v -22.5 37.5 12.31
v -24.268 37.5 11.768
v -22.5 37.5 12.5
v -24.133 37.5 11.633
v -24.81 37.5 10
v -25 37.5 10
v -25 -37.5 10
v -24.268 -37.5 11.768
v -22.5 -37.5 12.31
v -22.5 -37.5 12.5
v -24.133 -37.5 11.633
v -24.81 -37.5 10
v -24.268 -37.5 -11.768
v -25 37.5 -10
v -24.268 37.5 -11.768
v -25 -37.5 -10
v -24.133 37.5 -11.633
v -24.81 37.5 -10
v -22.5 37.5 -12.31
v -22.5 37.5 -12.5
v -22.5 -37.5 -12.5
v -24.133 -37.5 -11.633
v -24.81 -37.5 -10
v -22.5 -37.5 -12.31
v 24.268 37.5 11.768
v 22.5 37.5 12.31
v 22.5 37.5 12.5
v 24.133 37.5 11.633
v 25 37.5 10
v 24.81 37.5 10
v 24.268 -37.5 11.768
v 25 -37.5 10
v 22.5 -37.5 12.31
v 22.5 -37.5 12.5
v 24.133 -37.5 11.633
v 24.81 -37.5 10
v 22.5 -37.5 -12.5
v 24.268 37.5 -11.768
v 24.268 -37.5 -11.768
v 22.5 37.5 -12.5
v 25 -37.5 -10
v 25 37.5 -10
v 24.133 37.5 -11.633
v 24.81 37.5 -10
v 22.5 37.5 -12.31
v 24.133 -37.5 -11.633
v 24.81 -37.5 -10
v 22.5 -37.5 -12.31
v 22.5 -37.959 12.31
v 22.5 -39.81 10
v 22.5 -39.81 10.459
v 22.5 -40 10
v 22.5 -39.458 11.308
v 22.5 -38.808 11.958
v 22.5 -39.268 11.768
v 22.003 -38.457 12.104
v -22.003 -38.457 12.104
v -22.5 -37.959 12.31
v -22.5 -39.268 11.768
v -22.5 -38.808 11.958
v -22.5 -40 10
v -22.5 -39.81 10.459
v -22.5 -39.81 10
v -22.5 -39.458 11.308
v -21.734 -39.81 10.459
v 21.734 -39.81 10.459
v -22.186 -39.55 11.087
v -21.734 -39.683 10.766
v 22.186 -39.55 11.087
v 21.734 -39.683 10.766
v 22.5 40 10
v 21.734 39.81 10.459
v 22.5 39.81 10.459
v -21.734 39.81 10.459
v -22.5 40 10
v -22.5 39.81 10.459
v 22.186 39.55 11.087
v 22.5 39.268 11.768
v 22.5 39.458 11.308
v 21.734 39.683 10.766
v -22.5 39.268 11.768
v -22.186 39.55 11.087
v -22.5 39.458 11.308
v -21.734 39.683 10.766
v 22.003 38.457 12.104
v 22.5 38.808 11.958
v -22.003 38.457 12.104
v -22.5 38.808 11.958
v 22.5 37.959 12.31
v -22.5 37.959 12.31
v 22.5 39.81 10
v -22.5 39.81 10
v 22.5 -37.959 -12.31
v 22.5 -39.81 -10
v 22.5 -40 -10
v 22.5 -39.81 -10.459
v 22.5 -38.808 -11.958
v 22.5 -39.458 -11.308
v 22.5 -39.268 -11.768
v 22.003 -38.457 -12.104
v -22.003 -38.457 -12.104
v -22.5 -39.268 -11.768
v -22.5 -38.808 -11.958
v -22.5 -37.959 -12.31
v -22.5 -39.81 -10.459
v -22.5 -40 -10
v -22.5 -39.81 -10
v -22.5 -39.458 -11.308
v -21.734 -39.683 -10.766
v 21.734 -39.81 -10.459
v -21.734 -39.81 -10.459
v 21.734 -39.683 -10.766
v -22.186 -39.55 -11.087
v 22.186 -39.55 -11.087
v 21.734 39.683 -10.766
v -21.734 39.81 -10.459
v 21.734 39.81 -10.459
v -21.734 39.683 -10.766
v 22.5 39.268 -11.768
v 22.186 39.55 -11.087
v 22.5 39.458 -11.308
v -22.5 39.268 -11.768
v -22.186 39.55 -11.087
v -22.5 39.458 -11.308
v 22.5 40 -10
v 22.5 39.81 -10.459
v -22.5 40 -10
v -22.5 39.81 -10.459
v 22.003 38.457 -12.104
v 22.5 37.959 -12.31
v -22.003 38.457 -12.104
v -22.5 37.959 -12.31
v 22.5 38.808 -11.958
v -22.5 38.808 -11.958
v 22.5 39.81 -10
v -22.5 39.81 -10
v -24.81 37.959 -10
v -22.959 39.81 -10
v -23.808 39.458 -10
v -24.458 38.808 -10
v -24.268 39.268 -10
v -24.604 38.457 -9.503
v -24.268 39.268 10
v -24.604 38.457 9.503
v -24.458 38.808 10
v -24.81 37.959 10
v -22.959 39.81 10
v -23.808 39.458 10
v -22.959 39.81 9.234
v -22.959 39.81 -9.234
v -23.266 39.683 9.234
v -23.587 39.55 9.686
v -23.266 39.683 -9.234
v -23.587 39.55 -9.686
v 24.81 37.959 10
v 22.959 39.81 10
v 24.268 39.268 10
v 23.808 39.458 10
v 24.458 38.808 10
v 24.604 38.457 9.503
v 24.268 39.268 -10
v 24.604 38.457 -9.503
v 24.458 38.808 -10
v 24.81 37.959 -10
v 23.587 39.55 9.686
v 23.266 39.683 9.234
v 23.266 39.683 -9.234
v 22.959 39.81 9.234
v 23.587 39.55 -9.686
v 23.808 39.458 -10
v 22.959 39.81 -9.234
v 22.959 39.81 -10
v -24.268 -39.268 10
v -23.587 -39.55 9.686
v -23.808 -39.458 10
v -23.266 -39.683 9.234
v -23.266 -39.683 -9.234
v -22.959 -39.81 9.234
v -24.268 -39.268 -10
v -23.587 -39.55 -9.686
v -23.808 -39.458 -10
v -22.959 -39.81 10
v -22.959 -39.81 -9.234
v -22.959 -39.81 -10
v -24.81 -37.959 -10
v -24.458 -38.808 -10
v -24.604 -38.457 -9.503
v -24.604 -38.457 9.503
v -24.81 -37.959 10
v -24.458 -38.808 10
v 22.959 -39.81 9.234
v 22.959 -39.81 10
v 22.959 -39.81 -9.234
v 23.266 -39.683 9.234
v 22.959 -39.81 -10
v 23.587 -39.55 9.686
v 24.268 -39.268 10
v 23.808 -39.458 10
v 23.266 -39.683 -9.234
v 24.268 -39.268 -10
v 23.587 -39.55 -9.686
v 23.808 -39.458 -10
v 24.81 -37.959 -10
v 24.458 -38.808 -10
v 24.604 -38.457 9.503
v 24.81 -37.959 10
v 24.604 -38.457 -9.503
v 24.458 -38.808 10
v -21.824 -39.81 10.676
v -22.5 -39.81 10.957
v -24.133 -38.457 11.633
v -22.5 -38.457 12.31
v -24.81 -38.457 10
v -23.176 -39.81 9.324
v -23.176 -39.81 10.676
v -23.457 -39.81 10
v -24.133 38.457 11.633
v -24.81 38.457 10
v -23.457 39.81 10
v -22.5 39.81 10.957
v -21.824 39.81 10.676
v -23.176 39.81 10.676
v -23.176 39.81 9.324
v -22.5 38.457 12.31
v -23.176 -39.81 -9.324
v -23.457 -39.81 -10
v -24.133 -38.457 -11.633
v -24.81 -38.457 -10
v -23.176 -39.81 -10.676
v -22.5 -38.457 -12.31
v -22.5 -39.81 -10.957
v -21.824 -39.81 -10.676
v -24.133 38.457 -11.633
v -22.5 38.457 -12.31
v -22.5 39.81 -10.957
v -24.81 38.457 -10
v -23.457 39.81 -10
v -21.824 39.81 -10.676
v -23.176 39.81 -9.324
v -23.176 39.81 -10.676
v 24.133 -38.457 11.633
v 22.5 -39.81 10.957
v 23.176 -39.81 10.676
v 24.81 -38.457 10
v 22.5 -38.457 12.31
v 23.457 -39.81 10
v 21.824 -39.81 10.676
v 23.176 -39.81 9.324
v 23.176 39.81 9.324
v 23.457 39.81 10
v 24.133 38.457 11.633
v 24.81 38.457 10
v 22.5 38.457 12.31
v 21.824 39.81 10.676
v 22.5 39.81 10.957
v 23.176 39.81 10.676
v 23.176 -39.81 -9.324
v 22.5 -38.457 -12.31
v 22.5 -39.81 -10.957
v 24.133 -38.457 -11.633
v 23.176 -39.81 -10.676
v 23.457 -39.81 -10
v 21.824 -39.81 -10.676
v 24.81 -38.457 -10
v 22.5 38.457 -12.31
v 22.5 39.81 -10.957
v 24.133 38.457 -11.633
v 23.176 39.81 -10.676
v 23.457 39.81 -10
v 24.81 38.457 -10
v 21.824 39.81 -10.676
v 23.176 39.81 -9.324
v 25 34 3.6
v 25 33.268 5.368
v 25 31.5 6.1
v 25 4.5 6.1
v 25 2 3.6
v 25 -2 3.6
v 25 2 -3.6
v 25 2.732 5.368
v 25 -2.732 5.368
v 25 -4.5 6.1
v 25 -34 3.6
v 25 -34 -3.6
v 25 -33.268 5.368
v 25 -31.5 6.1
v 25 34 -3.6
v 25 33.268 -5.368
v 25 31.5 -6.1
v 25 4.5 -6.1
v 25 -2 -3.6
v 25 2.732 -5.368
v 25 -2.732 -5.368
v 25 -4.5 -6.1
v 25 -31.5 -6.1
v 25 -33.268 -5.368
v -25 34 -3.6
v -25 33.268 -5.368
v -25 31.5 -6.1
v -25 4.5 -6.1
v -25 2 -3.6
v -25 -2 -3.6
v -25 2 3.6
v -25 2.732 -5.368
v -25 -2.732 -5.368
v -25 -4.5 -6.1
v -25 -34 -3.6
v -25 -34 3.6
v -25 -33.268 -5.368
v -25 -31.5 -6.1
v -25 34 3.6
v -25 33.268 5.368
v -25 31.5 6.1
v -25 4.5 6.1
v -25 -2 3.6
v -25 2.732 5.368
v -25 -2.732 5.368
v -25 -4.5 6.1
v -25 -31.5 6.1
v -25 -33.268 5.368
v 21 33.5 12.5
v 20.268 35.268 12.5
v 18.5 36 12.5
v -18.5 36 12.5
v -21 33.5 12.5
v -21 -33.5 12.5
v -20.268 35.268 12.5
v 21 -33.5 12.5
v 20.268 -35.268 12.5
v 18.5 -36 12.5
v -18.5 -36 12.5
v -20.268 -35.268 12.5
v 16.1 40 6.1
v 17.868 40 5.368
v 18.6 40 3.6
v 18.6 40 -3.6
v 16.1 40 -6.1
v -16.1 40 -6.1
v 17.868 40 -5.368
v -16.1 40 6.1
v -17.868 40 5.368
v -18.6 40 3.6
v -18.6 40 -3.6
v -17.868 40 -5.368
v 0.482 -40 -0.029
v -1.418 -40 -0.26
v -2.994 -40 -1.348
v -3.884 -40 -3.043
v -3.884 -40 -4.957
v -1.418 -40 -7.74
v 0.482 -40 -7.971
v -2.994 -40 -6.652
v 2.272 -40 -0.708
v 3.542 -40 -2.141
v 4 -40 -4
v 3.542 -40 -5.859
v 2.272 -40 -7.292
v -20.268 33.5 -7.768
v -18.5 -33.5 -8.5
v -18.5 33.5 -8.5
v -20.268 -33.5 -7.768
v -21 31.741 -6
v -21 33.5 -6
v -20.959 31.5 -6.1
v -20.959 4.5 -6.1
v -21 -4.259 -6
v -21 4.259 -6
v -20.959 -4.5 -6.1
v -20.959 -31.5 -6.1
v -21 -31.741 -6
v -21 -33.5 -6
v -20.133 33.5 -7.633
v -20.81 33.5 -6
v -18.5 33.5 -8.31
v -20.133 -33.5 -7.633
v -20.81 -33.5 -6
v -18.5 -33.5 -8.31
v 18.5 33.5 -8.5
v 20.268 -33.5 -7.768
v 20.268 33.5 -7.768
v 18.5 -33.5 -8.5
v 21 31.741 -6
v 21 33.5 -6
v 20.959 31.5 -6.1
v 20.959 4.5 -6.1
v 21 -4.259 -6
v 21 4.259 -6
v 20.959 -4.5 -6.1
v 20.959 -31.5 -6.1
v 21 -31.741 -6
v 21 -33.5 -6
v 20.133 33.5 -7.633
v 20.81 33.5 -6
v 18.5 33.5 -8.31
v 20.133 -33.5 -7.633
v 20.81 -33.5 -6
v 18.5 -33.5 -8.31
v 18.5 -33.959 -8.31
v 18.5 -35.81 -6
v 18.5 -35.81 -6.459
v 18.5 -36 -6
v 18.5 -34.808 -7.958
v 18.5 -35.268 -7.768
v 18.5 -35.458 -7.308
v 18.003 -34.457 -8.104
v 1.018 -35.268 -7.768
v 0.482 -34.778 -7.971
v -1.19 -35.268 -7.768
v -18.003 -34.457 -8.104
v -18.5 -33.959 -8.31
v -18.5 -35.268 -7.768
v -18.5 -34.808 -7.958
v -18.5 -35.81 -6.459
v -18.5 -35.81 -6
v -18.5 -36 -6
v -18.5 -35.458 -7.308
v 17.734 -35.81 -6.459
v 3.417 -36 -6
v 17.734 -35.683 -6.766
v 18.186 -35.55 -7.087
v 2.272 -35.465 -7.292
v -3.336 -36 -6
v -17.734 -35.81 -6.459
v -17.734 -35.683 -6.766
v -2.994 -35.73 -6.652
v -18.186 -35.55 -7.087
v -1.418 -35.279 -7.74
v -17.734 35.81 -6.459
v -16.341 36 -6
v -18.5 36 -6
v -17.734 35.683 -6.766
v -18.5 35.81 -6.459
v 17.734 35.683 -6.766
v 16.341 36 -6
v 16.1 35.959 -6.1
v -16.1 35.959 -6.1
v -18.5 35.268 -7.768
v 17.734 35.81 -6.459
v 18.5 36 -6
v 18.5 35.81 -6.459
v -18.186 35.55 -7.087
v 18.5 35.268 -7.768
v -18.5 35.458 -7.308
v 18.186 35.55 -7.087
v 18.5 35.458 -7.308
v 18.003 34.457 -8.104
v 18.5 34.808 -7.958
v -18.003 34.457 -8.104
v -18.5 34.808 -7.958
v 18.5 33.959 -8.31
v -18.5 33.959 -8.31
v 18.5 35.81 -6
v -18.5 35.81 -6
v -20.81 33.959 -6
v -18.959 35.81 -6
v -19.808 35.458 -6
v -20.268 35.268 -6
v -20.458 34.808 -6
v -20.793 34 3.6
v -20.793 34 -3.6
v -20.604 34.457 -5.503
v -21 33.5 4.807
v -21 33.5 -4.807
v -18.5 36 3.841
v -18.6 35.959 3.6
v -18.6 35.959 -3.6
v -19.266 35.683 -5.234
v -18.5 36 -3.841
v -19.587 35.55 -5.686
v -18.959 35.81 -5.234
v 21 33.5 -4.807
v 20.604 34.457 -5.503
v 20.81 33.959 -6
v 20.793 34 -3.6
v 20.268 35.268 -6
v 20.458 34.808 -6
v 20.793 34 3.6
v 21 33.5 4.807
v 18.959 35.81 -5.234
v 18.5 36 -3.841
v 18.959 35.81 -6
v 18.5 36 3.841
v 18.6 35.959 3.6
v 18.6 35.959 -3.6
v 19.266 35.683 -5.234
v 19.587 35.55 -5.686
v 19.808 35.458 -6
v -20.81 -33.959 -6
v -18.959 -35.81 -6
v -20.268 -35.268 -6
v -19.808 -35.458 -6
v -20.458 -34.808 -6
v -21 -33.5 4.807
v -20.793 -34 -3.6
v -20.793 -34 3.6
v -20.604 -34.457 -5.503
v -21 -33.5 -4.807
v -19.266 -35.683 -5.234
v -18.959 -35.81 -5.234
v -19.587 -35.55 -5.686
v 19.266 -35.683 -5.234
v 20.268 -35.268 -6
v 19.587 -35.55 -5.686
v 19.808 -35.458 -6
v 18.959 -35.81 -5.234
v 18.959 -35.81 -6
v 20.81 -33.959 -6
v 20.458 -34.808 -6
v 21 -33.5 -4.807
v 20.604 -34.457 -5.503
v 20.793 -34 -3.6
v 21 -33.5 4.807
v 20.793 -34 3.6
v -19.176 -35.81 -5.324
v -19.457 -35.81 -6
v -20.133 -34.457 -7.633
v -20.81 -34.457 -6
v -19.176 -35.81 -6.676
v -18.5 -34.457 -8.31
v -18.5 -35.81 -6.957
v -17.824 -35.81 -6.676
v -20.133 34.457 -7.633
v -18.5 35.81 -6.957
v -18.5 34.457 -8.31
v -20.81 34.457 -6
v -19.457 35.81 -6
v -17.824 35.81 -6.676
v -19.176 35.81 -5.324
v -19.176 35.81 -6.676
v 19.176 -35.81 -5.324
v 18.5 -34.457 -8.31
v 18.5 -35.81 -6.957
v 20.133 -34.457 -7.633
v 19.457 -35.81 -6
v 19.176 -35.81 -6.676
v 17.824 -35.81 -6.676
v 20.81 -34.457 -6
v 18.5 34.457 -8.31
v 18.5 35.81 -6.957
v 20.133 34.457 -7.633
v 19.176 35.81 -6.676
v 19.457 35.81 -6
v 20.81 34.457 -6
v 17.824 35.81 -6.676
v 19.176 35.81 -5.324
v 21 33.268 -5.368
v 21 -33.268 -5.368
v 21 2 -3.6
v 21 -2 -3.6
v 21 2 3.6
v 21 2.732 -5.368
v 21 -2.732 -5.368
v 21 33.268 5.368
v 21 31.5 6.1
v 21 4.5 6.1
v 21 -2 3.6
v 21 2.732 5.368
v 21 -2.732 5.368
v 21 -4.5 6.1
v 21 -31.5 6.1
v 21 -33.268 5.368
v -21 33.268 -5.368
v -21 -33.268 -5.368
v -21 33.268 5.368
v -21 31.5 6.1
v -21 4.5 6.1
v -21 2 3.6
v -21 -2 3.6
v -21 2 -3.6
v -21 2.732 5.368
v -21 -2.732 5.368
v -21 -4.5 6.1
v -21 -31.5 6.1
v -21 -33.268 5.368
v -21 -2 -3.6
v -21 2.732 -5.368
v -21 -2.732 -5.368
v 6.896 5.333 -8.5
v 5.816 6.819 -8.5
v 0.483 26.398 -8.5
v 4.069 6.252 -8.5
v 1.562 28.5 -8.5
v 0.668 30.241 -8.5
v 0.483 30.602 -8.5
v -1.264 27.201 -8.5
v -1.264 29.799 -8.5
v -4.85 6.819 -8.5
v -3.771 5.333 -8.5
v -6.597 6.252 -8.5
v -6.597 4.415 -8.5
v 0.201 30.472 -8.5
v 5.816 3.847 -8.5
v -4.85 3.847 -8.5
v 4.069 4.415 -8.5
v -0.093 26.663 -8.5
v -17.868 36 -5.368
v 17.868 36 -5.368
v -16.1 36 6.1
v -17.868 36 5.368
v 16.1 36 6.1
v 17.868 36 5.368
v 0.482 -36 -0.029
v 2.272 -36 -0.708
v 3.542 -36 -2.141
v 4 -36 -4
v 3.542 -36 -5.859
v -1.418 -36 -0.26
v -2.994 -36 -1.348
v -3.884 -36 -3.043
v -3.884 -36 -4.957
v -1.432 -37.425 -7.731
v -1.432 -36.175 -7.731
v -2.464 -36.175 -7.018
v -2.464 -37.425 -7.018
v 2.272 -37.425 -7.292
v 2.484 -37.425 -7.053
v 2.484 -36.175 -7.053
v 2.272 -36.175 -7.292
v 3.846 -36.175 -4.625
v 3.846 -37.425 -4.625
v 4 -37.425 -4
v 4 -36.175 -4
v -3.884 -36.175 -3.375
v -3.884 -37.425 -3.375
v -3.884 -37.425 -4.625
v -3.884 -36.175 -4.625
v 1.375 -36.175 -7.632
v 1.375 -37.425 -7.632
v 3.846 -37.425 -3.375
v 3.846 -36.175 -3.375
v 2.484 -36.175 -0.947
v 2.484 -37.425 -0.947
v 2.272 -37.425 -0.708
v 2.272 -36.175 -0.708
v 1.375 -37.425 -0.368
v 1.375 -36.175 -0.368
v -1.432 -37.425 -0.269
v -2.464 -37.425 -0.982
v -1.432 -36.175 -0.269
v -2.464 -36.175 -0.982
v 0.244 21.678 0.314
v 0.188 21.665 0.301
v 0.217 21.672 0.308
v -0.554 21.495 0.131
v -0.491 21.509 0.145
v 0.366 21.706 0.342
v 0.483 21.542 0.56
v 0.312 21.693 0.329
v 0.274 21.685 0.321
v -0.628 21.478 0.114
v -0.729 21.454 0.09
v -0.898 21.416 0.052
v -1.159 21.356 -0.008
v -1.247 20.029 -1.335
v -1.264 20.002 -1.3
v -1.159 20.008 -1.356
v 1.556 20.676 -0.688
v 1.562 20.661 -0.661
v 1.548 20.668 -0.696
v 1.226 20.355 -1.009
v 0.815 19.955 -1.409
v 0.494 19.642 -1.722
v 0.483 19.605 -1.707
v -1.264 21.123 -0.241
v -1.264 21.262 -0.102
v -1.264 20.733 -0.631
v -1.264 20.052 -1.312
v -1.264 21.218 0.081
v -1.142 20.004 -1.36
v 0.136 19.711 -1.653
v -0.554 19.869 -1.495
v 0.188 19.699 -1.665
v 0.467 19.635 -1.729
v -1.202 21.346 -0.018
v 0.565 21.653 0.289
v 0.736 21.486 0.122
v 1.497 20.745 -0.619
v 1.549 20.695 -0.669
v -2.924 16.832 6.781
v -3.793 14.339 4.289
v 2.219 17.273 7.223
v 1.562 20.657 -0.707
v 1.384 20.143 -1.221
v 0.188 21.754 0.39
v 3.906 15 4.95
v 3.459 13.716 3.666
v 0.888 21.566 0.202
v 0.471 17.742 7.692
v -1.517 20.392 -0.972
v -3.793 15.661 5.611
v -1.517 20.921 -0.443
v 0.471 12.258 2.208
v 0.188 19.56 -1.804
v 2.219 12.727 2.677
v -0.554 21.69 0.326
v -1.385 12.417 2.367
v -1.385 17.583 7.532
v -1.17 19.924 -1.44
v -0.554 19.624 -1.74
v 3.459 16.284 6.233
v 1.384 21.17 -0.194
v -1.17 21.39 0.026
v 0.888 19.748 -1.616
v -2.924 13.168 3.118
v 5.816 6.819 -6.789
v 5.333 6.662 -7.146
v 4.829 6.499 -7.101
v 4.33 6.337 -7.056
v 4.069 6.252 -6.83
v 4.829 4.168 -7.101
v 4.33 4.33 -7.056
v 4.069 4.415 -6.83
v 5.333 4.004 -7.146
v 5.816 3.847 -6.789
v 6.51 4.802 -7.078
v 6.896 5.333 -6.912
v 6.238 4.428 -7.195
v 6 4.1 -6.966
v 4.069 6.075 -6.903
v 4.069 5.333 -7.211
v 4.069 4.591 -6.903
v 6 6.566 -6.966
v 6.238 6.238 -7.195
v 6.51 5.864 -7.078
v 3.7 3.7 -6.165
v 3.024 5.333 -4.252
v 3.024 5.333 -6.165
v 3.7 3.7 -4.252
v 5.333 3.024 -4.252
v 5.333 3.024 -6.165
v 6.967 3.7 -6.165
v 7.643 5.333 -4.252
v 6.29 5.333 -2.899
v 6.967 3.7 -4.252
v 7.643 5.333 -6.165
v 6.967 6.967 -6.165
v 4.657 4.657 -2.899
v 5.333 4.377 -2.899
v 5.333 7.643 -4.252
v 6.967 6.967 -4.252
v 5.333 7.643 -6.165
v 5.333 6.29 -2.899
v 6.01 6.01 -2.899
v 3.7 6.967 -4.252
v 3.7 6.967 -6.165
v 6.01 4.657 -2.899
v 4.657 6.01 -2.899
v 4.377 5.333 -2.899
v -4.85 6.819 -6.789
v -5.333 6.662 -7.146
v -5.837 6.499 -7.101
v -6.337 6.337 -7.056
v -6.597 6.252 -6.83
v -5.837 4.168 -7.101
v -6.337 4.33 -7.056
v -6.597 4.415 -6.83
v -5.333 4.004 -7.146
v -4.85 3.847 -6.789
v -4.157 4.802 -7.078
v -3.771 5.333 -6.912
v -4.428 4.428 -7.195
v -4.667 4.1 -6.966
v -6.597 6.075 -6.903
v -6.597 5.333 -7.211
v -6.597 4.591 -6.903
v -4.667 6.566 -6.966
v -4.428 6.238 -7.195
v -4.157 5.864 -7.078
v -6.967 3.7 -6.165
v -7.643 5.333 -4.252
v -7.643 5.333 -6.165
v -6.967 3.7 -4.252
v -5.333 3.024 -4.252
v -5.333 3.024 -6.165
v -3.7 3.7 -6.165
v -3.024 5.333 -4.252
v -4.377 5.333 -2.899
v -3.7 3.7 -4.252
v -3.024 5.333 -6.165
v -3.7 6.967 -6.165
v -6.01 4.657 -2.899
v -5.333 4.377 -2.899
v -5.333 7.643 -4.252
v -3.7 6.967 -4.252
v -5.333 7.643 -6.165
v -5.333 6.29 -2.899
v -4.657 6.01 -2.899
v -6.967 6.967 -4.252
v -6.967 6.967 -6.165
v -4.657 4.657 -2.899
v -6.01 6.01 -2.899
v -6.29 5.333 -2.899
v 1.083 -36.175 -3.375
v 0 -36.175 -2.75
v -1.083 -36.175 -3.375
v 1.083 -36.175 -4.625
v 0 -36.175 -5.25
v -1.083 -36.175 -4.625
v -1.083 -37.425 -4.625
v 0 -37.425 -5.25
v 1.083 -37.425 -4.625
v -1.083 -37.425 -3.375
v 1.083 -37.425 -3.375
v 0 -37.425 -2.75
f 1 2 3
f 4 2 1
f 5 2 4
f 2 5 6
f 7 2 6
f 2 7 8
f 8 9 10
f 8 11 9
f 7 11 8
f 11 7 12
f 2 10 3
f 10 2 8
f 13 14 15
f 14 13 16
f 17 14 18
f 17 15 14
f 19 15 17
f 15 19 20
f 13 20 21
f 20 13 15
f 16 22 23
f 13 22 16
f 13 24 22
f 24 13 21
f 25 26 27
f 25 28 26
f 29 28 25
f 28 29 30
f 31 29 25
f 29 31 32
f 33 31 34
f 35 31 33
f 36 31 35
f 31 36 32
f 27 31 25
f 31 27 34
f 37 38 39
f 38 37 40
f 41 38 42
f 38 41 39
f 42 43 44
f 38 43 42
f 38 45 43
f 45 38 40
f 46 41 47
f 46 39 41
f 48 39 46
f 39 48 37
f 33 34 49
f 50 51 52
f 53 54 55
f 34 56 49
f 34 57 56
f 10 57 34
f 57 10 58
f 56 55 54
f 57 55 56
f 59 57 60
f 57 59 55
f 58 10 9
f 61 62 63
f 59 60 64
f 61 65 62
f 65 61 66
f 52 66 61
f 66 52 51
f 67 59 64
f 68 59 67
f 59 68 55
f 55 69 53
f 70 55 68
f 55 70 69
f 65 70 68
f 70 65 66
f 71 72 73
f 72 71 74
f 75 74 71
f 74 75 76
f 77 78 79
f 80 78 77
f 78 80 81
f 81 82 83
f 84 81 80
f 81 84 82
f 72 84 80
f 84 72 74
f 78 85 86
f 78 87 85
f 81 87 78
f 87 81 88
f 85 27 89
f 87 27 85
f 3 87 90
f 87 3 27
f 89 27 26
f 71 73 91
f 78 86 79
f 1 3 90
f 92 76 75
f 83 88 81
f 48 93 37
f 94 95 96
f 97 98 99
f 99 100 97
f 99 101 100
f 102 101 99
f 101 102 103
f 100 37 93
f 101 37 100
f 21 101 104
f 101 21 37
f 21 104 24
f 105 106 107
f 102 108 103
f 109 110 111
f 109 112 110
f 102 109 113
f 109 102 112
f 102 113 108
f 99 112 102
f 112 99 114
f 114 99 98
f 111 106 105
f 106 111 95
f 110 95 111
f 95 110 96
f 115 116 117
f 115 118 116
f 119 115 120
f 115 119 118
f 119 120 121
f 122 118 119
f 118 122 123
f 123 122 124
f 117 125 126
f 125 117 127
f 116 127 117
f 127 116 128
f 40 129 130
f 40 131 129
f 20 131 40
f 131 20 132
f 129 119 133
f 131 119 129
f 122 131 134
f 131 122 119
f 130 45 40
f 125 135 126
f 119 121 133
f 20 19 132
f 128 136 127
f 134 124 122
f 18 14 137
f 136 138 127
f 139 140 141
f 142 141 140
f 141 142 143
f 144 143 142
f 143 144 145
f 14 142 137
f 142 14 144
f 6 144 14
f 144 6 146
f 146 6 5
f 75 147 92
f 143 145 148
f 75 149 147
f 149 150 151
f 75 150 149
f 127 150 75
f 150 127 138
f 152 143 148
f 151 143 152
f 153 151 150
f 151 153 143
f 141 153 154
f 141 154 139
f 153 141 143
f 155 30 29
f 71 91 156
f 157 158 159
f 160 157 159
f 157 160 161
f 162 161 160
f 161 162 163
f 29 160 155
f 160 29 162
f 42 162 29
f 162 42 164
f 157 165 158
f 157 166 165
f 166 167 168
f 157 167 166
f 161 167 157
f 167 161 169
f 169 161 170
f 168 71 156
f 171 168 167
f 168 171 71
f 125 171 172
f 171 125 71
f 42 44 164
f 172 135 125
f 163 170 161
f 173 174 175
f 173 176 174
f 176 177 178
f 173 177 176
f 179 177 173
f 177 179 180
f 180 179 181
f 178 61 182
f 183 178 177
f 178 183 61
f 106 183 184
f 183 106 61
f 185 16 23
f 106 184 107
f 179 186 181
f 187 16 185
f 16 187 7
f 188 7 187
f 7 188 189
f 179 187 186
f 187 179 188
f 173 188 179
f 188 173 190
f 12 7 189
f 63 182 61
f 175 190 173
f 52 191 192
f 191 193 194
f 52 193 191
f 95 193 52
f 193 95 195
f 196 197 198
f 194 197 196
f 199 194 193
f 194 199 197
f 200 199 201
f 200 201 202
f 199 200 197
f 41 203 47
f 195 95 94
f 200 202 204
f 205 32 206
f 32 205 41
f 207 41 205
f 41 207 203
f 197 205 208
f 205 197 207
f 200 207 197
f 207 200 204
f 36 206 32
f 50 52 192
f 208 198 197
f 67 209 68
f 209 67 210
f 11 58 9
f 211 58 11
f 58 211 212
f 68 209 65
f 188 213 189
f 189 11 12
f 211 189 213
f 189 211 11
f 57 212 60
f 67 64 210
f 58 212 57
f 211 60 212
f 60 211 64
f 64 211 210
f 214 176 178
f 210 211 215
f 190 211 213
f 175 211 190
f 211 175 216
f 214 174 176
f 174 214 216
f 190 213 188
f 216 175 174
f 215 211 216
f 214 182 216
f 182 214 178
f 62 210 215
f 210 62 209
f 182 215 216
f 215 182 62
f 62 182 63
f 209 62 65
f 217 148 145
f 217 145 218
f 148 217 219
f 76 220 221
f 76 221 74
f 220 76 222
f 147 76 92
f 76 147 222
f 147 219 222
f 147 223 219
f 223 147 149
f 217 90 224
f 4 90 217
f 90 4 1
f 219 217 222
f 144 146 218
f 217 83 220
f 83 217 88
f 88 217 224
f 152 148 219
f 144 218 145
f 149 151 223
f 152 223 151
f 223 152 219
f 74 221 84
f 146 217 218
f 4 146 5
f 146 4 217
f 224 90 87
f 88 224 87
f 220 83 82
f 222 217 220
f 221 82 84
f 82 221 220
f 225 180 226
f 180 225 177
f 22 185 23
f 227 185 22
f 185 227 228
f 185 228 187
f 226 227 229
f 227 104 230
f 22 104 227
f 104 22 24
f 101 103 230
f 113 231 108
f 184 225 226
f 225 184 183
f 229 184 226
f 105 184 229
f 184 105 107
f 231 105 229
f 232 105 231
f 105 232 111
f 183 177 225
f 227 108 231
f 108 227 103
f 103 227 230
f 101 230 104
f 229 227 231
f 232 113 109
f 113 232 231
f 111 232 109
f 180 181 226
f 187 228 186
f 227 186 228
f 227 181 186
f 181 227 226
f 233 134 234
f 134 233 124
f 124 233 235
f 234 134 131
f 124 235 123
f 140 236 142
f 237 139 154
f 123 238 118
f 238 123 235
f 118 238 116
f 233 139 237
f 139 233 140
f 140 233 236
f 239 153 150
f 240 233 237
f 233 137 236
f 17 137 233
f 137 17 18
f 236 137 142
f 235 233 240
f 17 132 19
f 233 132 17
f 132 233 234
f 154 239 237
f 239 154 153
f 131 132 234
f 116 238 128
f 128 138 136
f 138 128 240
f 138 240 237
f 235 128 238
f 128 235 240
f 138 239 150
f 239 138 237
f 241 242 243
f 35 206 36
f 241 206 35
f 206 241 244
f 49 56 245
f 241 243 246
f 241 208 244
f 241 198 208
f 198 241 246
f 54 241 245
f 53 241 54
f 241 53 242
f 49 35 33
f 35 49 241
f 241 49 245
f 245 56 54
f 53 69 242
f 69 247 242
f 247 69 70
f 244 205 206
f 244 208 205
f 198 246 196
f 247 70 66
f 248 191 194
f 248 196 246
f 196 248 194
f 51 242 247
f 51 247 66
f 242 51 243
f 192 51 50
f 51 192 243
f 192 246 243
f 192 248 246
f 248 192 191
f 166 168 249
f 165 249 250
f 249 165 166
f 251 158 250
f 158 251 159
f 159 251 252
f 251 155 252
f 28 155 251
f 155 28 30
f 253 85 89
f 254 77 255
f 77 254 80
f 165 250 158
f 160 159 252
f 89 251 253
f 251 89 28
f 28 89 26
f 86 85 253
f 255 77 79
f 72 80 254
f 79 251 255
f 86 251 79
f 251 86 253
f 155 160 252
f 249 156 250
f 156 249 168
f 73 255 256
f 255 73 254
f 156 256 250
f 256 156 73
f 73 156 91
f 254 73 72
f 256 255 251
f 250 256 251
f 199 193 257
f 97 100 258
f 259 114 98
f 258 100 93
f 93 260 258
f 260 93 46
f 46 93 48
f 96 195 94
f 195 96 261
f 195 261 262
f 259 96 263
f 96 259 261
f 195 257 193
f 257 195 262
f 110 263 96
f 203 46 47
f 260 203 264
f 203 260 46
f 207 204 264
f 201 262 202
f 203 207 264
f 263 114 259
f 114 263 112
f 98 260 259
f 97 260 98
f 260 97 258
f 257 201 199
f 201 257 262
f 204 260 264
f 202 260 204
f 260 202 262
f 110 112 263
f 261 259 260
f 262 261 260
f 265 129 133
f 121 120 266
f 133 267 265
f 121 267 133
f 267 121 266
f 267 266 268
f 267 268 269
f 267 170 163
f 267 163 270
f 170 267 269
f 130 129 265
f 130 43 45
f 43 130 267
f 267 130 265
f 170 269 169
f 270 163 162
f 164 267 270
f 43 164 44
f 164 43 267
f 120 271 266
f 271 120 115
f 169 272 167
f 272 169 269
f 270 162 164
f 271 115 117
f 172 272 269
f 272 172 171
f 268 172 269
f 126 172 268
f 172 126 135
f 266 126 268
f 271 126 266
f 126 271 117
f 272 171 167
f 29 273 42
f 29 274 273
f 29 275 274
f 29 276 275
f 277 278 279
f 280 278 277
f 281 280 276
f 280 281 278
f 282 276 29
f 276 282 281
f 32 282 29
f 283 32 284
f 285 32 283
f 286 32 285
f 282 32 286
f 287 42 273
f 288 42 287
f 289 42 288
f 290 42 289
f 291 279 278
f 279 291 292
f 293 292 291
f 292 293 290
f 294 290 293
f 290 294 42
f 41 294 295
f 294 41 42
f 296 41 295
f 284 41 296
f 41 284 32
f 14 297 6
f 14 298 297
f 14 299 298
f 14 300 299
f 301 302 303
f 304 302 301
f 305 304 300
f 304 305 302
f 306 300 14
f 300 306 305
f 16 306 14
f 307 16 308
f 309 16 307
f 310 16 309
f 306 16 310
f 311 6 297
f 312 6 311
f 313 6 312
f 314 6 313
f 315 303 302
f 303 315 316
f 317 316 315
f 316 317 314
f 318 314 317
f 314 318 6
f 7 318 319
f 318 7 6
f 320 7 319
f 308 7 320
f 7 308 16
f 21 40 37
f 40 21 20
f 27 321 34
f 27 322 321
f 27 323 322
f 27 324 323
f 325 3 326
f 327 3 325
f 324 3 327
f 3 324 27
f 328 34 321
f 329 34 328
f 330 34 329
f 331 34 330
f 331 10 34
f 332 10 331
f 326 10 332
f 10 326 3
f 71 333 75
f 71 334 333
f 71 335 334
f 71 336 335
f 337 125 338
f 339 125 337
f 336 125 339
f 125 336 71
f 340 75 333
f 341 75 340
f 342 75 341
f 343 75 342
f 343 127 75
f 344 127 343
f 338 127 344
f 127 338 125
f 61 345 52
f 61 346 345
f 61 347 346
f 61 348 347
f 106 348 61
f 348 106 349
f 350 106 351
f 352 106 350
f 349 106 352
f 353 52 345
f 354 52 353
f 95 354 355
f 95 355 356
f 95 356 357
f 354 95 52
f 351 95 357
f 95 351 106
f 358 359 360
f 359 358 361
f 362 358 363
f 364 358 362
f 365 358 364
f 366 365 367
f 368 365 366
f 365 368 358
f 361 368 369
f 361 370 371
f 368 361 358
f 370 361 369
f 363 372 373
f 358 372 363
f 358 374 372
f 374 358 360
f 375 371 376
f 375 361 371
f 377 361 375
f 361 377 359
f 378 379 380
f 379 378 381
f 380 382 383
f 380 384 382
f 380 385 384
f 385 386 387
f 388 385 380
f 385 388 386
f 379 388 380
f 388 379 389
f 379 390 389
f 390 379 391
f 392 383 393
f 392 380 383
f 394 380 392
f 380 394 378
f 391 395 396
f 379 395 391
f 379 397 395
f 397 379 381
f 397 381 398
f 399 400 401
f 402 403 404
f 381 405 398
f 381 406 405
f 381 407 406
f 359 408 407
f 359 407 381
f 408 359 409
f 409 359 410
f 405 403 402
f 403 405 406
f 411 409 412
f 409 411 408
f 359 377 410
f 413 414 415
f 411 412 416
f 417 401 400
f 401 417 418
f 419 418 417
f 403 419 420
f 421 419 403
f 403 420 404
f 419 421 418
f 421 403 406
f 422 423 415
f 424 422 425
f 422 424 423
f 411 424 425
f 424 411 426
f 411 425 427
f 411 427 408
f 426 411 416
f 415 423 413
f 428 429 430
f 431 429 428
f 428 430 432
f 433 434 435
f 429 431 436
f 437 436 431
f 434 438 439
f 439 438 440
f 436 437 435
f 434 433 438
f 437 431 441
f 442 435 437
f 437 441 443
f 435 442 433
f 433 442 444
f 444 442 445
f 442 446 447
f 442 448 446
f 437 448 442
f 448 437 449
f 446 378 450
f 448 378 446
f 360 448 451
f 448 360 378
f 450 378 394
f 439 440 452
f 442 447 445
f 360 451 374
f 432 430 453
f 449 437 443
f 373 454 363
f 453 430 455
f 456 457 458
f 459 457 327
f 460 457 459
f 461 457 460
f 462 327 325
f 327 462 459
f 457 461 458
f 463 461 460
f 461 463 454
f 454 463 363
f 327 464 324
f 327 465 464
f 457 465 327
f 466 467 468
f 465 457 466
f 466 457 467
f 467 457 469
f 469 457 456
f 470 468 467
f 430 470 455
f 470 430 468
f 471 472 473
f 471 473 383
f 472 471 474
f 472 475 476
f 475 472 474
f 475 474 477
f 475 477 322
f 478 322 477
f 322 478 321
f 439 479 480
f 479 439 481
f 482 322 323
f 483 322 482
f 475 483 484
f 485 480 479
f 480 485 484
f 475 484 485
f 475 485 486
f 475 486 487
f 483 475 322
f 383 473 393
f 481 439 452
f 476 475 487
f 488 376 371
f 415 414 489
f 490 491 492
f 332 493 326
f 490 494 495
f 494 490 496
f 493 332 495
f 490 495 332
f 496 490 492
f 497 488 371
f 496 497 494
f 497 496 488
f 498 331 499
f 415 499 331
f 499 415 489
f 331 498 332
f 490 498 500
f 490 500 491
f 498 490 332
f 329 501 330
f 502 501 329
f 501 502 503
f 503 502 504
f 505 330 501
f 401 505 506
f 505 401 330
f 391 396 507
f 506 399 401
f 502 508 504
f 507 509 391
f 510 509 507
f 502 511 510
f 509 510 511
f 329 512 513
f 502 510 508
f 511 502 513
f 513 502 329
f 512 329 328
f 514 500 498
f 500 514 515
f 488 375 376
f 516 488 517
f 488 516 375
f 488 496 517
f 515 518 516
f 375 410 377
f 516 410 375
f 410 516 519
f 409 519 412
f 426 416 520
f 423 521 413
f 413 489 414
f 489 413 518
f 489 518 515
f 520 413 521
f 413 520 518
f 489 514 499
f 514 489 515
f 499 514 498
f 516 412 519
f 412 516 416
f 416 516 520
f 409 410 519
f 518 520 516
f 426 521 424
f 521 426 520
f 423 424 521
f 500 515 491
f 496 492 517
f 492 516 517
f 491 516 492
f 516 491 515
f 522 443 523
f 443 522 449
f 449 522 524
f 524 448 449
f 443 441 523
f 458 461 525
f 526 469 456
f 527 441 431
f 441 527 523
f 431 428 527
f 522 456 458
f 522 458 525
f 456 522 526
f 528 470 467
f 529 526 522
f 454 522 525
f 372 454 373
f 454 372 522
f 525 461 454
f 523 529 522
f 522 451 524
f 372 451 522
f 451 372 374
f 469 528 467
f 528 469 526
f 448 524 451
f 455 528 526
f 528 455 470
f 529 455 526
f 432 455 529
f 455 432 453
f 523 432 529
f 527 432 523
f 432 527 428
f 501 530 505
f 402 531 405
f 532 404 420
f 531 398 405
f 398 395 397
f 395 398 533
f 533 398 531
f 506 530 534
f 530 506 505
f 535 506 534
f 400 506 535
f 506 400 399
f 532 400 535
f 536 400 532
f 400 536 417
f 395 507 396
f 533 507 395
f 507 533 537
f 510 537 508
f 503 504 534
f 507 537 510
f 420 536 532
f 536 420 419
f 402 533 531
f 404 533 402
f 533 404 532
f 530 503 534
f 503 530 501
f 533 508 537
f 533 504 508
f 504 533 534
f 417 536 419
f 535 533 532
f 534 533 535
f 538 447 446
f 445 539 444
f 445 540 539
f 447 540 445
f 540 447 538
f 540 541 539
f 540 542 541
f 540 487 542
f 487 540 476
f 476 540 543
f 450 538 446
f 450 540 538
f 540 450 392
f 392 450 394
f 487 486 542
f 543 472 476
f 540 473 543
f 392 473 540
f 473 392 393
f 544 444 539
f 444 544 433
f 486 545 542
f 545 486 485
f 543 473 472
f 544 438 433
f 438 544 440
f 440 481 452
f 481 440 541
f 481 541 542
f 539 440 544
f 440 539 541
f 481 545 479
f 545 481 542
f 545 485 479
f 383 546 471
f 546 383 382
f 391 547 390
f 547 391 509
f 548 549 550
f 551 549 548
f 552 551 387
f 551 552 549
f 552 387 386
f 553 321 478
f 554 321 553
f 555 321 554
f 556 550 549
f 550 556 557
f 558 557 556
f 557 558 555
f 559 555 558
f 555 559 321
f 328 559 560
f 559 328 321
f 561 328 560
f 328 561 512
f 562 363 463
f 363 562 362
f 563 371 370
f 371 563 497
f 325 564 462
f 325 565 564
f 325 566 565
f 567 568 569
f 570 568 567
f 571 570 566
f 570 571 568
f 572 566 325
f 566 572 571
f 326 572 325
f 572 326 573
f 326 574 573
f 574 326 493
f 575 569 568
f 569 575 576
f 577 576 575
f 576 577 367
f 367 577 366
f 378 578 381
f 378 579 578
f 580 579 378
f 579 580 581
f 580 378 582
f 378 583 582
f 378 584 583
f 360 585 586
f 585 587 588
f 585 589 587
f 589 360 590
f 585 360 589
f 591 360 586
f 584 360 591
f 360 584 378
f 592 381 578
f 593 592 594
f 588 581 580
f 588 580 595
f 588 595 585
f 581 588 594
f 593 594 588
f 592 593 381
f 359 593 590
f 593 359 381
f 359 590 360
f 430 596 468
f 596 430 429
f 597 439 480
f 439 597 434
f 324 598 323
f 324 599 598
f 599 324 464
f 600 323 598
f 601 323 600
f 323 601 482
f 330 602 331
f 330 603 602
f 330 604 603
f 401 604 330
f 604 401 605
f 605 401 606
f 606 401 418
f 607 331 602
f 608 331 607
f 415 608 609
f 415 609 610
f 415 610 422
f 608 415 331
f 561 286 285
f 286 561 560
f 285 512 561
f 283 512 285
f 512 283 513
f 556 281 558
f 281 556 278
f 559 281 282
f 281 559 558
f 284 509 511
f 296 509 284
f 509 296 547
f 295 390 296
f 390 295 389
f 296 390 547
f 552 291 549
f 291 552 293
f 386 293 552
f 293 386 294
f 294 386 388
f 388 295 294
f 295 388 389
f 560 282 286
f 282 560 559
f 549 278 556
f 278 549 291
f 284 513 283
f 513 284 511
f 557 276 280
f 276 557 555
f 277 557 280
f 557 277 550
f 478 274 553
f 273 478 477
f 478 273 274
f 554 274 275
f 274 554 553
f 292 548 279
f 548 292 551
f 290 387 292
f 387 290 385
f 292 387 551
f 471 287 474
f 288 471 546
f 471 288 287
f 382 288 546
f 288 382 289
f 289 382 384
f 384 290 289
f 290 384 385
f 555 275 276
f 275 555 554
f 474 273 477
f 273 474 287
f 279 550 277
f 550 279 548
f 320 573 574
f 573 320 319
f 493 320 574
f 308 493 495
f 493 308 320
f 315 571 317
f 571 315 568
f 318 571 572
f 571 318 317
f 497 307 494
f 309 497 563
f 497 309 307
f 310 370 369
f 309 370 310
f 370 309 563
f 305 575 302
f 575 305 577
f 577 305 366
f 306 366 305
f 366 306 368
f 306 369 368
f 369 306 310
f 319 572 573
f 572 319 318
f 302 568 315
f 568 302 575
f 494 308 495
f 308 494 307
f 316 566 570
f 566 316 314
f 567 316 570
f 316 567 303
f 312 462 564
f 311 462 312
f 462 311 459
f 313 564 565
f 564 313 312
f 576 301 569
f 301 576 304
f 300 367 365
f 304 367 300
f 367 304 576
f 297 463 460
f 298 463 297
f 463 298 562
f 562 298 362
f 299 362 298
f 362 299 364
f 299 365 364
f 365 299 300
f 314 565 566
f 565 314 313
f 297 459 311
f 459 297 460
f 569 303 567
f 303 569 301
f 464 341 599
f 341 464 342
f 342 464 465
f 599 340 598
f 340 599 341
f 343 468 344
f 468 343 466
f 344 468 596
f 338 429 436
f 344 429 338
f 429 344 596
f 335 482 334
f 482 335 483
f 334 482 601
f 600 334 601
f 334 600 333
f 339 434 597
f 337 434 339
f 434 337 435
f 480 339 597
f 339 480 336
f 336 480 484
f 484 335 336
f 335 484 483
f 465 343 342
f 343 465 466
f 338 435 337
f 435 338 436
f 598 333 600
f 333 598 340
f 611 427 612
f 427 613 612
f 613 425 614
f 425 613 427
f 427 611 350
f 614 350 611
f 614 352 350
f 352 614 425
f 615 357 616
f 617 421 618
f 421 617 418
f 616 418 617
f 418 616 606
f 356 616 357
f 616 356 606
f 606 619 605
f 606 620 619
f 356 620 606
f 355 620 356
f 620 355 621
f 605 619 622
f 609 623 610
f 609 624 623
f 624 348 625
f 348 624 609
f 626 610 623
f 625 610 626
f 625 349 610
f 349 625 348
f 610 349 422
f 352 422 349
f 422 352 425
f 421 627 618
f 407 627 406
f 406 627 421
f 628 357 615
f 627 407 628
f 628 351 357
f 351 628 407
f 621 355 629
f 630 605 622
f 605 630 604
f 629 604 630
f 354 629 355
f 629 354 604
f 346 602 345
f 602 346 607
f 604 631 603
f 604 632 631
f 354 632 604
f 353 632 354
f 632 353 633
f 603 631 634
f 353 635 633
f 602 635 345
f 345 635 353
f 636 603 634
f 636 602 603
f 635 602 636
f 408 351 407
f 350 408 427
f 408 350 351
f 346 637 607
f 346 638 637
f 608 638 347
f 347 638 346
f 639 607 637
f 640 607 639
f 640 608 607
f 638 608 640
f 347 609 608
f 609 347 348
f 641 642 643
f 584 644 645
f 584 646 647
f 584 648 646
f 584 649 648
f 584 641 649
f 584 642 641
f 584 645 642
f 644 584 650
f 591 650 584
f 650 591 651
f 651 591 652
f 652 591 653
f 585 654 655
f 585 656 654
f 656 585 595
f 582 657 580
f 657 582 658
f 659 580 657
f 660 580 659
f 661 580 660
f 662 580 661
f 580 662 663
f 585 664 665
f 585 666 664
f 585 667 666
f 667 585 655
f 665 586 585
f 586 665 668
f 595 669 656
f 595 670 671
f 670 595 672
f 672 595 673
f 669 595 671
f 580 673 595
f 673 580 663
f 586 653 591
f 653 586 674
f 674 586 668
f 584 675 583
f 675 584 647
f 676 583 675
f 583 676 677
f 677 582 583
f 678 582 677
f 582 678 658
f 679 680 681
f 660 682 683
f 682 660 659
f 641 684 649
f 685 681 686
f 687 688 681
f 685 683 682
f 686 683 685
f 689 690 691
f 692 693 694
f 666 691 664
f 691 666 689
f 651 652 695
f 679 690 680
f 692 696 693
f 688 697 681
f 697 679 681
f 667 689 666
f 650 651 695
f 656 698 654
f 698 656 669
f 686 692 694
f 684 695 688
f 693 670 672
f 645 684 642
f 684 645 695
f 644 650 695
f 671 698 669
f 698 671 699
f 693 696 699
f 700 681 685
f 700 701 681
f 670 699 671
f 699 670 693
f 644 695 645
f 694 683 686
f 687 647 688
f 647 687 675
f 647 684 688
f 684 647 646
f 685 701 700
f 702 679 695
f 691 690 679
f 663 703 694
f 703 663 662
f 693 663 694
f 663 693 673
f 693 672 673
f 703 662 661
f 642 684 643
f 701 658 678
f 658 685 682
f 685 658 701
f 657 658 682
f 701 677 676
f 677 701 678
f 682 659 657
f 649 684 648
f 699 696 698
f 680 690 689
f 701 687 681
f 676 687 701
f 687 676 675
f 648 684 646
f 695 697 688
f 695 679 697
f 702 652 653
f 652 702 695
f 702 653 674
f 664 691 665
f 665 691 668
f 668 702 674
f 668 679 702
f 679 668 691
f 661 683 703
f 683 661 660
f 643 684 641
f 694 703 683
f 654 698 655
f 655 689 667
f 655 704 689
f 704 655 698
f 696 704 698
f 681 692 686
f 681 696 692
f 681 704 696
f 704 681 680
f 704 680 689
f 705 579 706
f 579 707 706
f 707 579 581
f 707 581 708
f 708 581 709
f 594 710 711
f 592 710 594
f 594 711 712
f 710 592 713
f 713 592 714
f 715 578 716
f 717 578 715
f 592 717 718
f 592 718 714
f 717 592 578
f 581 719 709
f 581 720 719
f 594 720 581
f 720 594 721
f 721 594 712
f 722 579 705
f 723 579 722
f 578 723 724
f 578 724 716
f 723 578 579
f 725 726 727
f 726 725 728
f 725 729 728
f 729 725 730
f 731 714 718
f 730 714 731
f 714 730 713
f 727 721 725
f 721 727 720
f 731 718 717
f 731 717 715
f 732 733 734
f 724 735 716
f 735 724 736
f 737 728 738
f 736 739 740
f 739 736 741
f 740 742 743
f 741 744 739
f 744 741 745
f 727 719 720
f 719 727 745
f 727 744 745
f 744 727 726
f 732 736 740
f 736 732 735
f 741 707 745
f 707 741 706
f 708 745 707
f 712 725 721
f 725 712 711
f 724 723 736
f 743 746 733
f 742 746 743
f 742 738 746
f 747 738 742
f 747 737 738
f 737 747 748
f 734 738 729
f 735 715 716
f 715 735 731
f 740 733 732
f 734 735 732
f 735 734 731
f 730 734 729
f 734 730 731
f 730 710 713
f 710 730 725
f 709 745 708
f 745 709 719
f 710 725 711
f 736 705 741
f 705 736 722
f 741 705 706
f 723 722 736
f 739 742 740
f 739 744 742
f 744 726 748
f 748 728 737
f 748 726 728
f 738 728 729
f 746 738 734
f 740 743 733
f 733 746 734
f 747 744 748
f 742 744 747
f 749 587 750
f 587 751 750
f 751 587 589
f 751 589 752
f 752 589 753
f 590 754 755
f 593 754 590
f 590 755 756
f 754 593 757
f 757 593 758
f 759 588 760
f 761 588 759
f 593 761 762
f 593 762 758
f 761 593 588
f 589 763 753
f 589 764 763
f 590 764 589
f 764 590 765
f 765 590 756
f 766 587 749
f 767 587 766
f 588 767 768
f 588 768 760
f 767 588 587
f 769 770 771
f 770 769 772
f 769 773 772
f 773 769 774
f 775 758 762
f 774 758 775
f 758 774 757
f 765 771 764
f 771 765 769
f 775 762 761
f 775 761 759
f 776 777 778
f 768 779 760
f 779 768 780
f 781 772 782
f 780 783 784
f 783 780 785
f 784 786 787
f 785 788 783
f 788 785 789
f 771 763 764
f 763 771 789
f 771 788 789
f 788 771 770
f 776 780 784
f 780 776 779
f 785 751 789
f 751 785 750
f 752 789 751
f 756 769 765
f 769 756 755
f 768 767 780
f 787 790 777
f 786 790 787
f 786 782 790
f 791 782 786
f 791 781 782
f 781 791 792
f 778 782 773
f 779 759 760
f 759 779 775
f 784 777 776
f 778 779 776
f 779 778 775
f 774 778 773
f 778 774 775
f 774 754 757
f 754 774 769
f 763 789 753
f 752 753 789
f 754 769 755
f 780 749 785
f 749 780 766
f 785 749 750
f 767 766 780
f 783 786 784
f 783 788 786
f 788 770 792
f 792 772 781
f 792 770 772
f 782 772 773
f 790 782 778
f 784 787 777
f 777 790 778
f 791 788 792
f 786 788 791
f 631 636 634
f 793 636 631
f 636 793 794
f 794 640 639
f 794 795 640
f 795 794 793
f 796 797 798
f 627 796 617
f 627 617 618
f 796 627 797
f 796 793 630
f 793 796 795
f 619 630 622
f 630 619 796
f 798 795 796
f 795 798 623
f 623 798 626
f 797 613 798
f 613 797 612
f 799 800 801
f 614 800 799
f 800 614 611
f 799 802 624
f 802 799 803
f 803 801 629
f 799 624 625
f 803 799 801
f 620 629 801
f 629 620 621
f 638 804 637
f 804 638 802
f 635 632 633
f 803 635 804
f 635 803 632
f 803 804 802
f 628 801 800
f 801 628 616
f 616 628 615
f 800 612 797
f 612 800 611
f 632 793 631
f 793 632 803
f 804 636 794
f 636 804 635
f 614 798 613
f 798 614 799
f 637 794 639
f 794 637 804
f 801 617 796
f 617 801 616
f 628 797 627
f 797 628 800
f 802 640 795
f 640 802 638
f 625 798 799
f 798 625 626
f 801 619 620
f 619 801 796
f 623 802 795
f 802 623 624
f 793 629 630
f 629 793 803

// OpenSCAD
///////////////////////////////////////////////////////////////////////////////
/////////////////////////// Doll House Shower //////////////////////////////////
/*/////////////////////////////////////////////////////////////////////////////
date started: 10/22/2014
date finished:
modeler:		
copyright:		N/A
comments:		For Katie's school project
*////////////////////////////////////////////////////////////////////////////////
/////////////////////////// - Paramaters - ////////////////////////////////////
///////////////////////////////////////////////////////////////////////////////
//$fn=50;
use <MCAD/boxes.scad>;
// height = 80; // 80mm

// How tall should the shower be in mm? [10:145] All other measurements and dimensions will auto-adjust.
height = 80; // [10:145]


////////////// math //////// - Don't Change - //////////////// math ////////////
width = height/1.6; // 1.6
length = height/(1.6*2); // 3.0
wall = height/10; // 10
corner_rad = height/32; // 2.5mm
///////////////////////////////////////////////////////////////////////////////
//////////////////////////// - Renders - //////////////////////////////////////
///////////////////////////////////////////////////////////////////////////////
rotate([-90,0,0])
//rotate([-00,0,0])
{
	shower_box();
	nozzle();
	handle();
	drain();
}
///////////////////////////////////////////////////////////////////////////////
///////////////////////////// - Modules - /////////////////////////////////////
///////////////////////////////////////////////////////////////////////////////
module shower_box()
{
	difference()
	{
		roundedBox([width, length, height], corner_rad, false);
		translate([0,-wall/2,0]) roundedBox([width-wall, length, height-wall], corner_rad, false);
		translate([0,wall/2,-(height/2)-wall/2]) cylinder(h = wall*2, r=corner_rad*1.6);
		translate([width/2,0,-((height/4)-(wall/4))]) roundedBox([wall*2, (length-wall*1.6), ((height-(wall+wall))/2)], corner_rad, false); // ** (2) // ** (1)
		translate([width/2,0,((height/4)-(wall/4))]) roundedBox([wall*2, (length-wall*1.6), ((height-(wall+wall))/2)], corner_rad, false); // ** (2) // ** (1)
		translate([-width/2,0,-((height/4)-(wall/4))]) roundedBox([wall*2, (length-wall*1.6), ((height-(wall+wall))/2)], corner_rad, false); // ** (2) // ** (1)
		translate([-width/2,0,((height/4)-(wall/4))]) roundedBox([wall*2, (length-wall*1.6), ((height-(wall+wall))/2)], corner_rad, false); // ** (2) // ** (1)
		translate([0,0,height/2]) roundedBox([width-wall*1.6, length-wall*1.6, wall*2], corner_rad, false);
	}
}
///////////////////////////////////////////////////////////////////////////////
module nozzle()
{
	translate([0,0,height/4]) rotate([-45,00,0]) cylinder(h=wall*2, r=corner_rad/1.6);
	translate([0,-(((wall*2)-(wall/4)/sin(90))*sin(45))/2,height/4-(corner_rad*2)]) rotate([-45,00,0]) cylinder(h=wall, r2=corner_rad/1.6, r1=(corner_rad/1.6)*2.5);
}
///////////////////////////////////////////////////////////////////////////////
module handle()
{
	translate([height/15,length/4.8,height/15])
	{
		rotate([-90,0,0])
		{
			cylinder(h=wall/1.6, r=corner_rad/1.6);
			sphere(r = corner_rad);
		}
	}

	translate([-height/15,length/4.8,height/15])
	{
		rotate([-90,0,0])
		{
			cylinder(h=wall/1.6, r=corner_rad/1.6);
			sphere(r = corner_rad);
		}
	}

}
///////////////////////////////////////////////////////////////////////////////
module drain()
{
	for ( i = [1 : 3] )
	{
		translate([0,wall/2,-(height/2)+wall/2.5])
		rotate( [0, 0, i * 360 / 3])
	    cube([corner_rad*4,corner_rad/2,corner_rad/2],center=true);
	}
}
///////////////////////////////////////////////////////////////////////////////
///////////////////////////// - Echos - ///////////////////////////////////////
///////////////////////////////////////////////////////////////////////////////
echo(" -- /////////////////////////////////////// --");
echo("$fn //Resolution = ",$fn); //Resolution
//echo(" = ", ); //Description
echo("height = ",height );
echo("corner_rad = ",corner_rad );
echo("width = ",width );
echo("length = ",length );
echo("wall = ",wall," -actually is half this value as the equations in the code divide it by 2 =",wall/2);
//echo("(height-wall*1.6)/corner_rad+5 = ",(height-wall*1.6)/corner_rad+5," ** (1)");
echo("height*0.3985 = ",height*0.3985," ** (2)");
echo("(length-wall*1.6) = ",(length-wall*1.6));
echo("((height-(wall+wall))/2) = ",((height-(wall+wall))/2) );
echo("(-height/(height*0.053125)) = ",(-height/(height*0.053125)) );
echo("((height/4)-(wall/4)) = ",((height/4)-(wall/4)) );
echo("length/29 = ",length/29 );
echo("corner_rad/1.6 = ",corner_rad/1.6 );
echo("-(corner_rad*2) = ",-(corner_rad*2) );
echo("(wall*2)-(wall/2) = ",(wall*2)-(wall/2) );
echo("-(((wall*2)-(wall/4)/sin(90))*sin(45))/2 = ",-(((wall*2)-(wall/4)/sin(90))*sin(45))/2 );
echo("height/4-(corner_rad*2) = ",height/4-(corner_rad*2) );
echo("length/(corner_rad*corner_rad) = ",length/(corner_rad*corner_rad) );
echo("-(height/2)+wall/3.12+.5 = ",-(height/2)+wall/3.12+.5 );
echo("-(height/2)+wall/2.5 = ",-(height/2)+wall/2.5 );
echo(" -- /////////////////////////////////////// --");
echo("clip - ([0,0,0])");
echo("clip - translate([0,0,0]){");
echo("clip - rotate([0,0,0]){");
//echo ("This is ",number,3," and that's it.");
echo(" -- /////////////////////////////////////// --");
///////////////////////////////////////////////////////////////////////////////
////////////////////////////// - Clip_Pad - ///////////////////////////////////
///////////////////////////////////////////////////////////////////////////////
//	([0,0,0])
//	translate([0,0,0]){
//	rotate([0,0,0]){
//
//  -- Golden Rule of 1.6
//
// roundedBox([width, height, depth], float radius, bool sidesonly);
// EXAMPLE USAGE:
// roundedBox([20, 30, 40], 5, true);
// size is a vector [w, h, d]
///////////////////////////////////////////////////////////////////////////////
///////////////////////////////////////////////////////////////////////////////
///////////////////////////////////////////////////////////////////////////////
